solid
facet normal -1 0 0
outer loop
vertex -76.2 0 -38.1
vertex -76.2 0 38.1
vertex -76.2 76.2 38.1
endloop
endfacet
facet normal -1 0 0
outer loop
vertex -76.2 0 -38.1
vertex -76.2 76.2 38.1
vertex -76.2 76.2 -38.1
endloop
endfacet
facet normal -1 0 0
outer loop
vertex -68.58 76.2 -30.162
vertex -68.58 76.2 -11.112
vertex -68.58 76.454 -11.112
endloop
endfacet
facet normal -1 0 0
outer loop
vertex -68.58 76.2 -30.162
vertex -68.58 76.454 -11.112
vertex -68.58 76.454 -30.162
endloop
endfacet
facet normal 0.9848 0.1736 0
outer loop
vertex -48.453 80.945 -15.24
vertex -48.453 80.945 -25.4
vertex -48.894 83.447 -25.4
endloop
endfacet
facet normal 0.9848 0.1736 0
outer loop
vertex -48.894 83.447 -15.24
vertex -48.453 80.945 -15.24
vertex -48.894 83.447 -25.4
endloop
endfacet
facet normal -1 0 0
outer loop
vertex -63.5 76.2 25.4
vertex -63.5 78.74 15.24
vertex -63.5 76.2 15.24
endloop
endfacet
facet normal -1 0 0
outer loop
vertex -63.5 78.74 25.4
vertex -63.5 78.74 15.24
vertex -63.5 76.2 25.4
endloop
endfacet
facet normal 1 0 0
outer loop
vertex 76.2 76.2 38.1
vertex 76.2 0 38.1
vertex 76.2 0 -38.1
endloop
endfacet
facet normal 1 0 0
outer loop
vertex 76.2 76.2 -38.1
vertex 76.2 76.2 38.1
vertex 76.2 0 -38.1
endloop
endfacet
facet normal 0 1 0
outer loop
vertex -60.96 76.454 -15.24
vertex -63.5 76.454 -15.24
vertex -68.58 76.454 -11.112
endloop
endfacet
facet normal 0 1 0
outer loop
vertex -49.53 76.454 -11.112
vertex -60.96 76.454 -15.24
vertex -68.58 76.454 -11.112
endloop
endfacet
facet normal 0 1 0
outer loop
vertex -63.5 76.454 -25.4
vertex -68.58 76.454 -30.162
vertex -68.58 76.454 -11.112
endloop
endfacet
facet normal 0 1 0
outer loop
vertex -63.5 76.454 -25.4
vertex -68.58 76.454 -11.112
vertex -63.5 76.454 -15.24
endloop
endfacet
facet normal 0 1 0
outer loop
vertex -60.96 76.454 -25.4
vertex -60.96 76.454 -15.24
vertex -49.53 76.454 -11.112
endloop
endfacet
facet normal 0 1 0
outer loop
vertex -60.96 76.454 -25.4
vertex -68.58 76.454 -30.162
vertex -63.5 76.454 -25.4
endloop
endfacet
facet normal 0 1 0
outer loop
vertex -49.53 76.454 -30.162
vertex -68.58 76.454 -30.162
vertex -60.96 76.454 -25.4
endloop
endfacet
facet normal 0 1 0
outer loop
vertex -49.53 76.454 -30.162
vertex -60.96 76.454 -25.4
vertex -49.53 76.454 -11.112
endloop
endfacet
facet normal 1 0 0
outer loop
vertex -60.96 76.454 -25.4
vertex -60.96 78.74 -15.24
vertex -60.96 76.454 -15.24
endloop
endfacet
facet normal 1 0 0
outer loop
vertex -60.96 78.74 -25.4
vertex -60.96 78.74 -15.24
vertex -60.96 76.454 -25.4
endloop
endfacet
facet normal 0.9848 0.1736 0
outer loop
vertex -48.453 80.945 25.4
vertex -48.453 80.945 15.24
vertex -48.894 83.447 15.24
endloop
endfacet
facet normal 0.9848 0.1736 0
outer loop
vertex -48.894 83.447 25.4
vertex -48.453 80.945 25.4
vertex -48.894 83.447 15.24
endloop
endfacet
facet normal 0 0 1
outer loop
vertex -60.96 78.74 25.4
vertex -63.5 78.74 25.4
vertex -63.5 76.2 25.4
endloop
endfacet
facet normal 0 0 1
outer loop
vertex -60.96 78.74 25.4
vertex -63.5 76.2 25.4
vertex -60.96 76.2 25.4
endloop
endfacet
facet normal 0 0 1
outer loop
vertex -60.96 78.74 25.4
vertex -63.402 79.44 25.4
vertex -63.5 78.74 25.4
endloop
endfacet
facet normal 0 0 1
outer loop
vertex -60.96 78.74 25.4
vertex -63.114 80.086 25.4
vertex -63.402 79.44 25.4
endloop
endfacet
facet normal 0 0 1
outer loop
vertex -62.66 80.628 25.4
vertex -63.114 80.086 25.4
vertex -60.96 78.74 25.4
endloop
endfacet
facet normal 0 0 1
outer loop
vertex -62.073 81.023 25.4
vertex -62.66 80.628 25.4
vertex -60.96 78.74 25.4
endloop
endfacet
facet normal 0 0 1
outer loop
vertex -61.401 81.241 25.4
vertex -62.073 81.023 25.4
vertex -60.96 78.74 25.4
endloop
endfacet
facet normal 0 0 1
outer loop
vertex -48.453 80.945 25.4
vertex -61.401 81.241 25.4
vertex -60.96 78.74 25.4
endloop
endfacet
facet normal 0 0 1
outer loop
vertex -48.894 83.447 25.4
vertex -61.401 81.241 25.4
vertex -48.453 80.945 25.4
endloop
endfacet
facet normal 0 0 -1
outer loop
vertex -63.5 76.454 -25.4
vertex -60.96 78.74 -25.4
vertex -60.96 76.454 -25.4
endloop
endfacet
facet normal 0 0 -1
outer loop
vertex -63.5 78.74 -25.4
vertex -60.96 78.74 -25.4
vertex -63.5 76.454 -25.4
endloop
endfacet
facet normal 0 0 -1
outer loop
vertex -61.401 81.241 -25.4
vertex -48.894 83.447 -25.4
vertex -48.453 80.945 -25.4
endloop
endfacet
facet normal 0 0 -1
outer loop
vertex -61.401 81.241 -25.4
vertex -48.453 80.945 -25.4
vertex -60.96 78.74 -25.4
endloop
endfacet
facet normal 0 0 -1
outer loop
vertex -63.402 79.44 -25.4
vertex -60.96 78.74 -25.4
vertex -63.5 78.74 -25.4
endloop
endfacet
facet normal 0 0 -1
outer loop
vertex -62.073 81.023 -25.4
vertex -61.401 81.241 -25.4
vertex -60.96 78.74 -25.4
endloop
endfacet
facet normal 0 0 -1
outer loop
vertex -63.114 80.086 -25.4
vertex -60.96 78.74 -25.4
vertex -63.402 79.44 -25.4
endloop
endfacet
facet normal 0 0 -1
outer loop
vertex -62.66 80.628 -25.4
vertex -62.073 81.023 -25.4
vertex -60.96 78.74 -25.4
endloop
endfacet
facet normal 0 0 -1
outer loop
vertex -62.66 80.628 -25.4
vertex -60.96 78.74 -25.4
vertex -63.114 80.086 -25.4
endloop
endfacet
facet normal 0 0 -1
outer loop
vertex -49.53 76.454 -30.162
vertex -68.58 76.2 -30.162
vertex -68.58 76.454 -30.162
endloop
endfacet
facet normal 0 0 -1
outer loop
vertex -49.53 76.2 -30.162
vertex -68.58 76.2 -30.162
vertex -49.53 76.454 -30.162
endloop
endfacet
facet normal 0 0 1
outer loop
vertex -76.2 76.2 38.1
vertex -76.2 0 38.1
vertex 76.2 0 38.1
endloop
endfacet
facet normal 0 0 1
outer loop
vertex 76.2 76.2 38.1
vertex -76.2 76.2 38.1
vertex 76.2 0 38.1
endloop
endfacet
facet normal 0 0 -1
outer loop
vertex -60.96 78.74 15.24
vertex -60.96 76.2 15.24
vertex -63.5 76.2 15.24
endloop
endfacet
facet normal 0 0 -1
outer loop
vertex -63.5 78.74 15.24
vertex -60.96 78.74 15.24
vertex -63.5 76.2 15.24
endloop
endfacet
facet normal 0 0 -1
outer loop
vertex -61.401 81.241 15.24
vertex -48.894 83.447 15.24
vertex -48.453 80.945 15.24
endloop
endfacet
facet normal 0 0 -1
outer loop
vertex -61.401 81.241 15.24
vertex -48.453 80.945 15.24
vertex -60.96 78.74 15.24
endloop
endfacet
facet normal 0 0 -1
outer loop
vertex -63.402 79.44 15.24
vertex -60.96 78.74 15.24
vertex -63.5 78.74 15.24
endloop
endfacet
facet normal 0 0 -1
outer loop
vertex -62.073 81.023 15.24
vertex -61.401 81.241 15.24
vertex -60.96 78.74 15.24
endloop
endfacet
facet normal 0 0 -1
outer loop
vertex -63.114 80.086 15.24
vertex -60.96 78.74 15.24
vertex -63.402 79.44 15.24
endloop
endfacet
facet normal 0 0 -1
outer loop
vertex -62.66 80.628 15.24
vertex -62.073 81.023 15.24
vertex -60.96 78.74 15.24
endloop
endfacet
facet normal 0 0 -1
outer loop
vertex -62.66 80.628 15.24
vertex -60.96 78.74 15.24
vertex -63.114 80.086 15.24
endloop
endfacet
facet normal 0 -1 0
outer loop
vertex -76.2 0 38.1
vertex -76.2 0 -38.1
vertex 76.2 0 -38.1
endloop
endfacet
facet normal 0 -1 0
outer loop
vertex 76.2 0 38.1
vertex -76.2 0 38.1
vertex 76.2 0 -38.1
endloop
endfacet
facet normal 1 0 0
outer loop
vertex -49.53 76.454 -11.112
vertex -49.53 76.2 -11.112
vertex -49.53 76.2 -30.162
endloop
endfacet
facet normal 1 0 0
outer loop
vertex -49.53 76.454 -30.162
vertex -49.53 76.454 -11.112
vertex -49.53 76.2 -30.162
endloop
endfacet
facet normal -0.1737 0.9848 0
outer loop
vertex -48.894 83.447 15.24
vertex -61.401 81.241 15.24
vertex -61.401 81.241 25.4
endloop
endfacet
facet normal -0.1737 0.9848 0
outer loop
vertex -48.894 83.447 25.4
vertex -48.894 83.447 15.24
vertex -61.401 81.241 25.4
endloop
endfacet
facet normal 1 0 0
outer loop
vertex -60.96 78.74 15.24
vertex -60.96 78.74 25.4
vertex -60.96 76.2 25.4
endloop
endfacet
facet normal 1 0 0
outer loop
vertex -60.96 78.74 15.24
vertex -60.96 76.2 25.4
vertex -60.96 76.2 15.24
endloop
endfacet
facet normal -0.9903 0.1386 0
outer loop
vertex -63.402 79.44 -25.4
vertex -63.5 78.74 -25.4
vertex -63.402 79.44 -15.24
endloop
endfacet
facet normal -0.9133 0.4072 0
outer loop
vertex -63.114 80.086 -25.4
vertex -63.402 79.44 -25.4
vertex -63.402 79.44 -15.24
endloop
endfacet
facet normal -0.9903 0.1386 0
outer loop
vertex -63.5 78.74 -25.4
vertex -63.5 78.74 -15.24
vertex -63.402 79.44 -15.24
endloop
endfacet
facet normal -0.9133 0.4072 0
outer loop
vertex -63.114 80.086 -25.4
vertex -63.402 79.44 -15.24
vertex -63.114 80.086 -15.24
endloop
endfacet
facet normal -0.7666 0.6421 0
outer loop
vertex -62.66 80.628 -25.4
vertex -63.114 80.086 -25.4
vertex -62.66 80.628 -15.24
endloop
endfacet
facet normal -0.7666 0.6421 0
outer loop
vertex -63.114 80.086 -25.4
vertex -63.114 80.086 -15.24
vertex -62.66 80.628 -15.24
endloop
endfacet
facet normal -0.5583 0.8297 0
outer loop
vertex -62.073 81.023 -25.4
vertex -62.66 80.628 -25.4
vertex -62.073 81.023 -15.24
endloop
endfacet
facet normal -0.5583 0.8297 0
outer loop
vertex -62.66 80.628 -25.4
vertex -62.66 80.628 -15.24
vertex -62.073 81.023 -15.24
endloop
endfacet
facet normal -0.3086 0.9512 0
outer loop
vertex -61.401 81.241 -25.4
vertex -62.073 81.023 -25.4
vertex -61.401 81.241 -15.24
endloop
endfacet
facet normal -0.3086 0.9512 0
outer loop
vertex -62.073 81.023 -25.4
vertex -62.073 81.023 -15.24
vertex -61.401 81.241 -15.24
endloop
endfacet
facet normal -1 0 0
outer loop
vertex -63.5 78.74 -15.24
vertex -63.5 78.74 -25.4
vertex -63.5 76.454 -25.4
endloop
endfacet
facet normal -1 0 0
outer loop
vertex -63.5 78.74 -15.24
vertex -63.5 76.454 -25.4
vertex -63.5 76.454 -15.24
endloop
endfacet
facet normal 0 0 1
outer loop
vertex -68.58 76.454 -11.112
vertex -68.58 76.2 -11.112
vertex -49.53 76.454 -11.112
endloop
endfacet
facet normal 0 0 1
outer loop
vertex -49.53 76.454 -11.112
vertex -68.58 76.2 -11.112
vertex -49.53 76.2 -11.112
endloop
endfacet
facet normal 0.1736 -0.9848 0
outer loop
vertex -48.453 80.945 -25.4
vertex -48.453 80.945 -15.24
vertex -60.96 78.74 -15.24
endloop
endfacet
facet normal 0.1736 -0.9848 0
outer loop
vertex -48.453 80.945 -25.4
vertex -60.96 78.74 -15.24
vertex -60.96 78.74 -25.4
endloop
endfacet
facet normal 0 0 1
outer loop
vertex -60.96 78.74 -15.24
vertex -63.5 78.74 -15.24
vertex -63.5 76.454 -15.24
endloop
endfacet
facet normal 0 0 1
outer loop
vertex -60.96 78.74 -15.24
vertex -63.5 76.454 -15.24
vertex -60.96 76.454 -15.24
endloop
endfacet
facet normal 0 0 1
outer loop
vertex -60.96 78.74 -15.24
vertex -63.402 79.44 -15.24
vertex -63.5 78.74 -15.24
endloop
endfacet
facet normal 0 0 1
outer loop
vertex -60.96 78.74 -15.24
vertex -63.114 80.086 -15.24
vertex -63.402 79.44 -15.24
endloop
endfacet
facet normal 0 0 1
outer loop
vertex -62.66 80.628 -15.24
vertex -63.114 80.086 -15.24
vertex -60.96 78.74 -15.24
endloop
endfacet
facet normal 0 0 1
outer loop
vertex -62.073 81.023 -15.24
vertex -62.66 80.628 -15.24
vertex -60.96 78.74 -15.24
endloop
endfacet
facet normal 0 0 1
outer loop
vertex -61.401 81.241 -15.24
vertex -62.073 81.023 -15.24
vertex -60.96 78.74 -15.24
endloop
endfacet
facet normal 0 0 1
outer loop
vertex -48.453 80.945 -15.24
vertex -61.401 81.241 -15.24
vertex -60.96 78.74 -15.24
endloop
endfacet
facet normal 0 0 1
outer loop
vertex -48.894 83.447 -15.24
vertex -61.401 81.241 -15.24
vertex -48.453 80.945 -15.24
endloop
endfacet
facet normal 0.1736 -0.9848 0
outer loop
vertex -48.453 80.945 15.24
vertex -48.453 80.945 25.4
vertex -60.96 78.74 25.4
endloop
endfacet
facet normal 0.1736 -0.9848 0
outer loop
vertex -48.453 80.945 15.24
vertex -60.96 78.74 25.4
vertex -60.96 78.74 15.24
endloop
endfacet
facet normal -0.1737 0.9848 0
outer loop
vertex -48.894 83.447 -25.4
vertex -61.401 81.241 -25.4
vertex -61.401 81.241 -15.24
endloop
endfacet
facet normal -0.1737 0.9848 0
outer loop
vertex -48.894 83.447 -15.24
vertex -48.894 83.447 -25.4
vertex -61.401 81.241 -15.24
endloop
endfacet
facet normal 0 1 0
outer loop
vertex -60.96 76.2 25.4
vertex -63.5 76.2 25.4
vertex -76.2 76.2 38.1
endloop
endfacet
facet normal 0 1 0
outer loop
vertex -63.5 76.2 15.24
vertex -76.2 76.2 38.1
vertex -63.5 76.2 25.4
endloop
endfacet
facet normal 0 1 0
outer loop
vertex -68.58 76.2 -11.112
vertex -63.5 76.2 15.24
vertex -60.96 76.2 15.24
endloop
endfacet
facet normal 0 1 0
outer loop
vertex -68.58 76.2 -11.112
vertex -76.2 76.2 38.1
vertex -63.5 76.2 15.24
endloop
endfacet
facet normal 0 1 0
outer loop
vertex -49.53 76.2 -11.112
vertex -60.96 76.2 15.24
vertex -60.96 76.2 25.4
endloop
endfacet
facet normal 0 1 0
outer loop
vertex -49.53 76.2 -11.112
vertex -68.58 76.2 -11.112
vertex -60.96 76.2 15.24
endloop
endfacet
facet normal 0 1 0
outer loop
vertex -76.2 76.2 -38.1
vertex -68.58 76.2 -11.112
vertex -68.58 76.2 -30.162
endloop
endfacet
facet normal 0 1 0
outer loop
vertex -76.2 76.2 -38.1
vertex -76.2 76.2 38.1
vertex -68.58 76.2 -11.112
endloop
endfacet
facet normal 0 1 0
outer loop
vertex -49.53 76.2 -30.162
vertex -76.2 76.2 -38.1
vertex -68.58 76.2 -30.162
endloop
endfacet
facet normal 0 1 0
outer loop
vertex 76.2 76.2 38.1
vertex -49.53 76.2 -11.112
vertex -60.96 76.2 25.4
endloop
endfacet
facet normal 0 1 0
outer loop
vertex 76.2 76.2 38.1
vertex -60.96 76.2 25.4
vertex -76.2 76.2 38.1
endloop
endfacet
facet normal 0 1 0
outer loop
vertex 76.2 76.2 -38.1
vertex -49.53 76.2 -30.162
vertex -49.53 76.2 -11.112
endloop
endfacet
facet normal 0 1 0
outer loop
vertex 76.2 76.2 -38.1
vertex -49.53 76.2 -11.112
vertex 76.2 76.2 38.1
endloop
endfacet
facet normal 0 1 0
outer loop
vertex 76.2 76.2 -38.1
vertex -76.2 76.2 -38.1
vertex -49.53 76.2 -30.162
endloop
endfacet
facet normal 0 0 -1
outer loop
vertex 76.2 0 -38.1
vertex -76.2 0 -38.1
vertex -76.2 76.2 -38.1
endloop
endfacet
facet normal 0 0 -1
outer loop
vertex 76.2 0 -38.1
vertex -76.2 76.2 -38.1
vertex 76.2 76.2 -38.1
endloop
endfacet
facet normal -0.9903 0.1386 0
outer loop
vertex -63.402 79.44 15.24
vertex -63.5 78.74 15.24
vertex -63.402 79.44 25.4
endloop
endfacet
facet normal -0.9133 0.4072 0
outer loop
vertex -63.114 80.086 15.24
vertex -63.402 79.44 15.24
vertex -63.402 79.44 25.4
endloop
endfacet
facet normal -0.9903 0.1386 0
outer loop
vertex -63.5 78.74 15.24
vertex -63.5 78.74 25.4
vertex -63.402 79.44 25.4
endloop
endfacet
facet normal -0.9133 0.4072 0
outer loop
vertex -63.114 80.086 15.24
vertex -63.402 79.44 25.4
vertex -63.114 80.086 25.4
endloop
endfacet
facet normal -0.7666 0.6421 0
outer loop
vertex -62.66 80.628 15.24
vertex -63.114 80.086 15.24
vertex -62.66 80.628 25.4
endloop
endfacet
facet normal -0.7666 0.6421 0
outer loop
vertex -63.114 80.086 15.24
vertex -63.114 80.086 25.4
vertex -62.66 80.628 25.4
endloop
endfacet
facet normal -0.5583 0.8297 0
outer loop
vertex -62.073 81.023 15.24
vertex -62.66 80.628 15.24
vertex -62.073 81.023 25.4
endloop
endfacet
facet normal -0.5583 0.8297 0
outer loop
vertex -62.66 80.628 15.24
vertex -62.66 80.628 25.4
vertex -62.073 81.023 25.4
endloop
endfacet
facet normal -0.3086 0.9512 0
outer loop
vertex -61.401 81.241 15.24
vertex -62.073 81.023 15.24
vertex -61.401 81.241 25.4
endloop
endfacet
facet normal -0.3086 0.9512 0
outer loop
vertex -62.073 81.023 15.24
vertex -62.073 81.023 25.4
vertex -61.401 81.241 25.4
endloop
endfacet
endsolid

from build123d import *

# Parameters (mm, degrees)
SKETCH1_W           = 152.4
SKETCH1_H           = 76.2
BOSS_EXTRUDE1_DEPTH = 76.2
SKETCH2_W           = 2.54
SKETCH2_H           = 10.16
SKETCH5_W           = 19.05
SKETCH5_H           = 19.05
BOSS_EXTRUDE2_DEPTH = 0.254


with BuildPart() as part:
    # Sketch1 → Boss-Extrude1 (new body)
    with BuildSketch(Plane(origin=(0, 0, 0), x_dir=(1, 0, 0), z_dir=(0, 1, 0))):
        Rectangle(SKETCH1_W, SKETCH1_H)
    extrude(amount=BOSS_EXTRUDE1_DEPTH)

    # Sweep1: sweep along a path in Sketch4
    with BuildLine(Plane.XY) as sweep1_path:
        Line((-62.23, 76.2), (-62.23, 78.74))
        ThreePointArc((-62.23, 78.74), (-61.932876443, 79.556340264), (-61.180533186, 79.990705846))
        Line((-61.180533186, 79.990705846), (-48.673474722, 82.196037703))
    # Sketch2 → Sweep1 (sweep)
    with BuildSketch(Plane(origin=(0, 76.2, 0), x_dir=(1, 0, 0), z_dir=(0, 1, 0))):
        with Locations((-62.23, 20.32)):
            Rectangle(SKETCH2_W, SKETCH2_H)
        with Locations((-62.23, -20.32)):
            Rectangle(SKETCH2_W, SKETCH2_H)
    sweep(path=sweep1_path.line)

    # Sketch5 → Boss-Extrude2 (add)
    with BuildSketch(Plane(origin=(0, 76.2, 0), x_dir=(1, 0, 0), z_dir=(0, 1, 0))):
        with Locations((-59.055, 20.6375)):
            Rectangle(SKETCH5_W, SKETCH5_H)
    extrude(amount=BOSS_EXTRUDE2_DEPTH)


solid = part.part
